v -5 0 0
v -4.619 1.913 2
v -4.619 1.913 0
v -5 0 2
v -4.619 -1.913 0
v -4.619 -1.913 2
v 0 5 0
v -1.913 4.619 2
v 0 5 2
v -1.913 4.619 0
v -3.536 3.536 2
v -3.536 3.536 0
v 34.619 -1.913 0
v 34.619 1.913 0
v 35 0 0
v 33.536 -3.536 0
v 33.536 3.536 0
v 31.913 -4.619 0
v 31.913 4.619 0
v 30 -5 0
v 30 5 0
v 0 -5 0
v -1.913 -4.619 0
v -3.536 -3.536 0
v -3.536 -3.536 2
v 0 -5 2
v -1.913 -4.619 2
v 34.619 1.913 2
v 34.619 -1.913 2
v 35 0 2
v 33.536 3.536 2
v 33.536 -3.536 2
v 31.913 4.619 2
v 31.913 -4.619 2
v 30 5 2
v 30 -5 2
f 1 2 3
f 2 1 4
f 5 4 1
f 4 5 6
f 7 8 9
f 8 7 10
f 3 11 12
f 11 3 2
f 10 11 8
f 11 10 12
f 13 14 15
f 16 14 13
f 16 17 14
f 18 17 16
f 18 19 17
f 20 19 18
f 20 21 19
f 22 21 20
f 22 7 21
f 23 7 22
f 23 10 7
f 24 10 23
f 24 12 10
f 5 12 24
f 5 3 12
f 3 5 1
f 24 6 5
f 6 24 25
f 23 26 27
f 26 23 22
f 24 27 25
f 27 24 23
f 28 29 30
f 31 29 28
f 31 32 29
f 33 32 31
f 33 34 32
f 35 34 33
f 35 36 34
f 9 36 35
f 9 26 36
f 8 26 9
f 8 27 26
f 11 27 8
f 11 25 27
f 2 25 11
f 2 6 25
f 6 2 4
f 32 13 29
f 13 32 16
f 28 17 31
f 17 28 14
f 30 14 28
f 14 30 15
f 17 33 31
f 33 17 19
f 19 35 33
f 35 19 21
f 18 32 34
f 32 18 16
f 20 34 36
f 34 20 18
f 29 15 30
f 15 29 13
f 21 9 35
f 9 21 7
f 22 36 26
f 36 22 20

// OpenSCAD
// oval.scad

// Oval plate on X-Y plane, one radiused end centred on the origin,
// and the other centred at [l,0,0]

module oval(l, w, t) {
    // l is distance between radius end centres
    // w is width of oval (twice end radius)
    // t is thickness of plate
    cylinder(d=w, h=t) ;
    translate([l,0,0])
        cylinder(d=w, h=t) ;
    translate([0,-w/2,0])
        cube(size=[l,w,t]) ;
}

// Example
oval(30,10,2) ;
